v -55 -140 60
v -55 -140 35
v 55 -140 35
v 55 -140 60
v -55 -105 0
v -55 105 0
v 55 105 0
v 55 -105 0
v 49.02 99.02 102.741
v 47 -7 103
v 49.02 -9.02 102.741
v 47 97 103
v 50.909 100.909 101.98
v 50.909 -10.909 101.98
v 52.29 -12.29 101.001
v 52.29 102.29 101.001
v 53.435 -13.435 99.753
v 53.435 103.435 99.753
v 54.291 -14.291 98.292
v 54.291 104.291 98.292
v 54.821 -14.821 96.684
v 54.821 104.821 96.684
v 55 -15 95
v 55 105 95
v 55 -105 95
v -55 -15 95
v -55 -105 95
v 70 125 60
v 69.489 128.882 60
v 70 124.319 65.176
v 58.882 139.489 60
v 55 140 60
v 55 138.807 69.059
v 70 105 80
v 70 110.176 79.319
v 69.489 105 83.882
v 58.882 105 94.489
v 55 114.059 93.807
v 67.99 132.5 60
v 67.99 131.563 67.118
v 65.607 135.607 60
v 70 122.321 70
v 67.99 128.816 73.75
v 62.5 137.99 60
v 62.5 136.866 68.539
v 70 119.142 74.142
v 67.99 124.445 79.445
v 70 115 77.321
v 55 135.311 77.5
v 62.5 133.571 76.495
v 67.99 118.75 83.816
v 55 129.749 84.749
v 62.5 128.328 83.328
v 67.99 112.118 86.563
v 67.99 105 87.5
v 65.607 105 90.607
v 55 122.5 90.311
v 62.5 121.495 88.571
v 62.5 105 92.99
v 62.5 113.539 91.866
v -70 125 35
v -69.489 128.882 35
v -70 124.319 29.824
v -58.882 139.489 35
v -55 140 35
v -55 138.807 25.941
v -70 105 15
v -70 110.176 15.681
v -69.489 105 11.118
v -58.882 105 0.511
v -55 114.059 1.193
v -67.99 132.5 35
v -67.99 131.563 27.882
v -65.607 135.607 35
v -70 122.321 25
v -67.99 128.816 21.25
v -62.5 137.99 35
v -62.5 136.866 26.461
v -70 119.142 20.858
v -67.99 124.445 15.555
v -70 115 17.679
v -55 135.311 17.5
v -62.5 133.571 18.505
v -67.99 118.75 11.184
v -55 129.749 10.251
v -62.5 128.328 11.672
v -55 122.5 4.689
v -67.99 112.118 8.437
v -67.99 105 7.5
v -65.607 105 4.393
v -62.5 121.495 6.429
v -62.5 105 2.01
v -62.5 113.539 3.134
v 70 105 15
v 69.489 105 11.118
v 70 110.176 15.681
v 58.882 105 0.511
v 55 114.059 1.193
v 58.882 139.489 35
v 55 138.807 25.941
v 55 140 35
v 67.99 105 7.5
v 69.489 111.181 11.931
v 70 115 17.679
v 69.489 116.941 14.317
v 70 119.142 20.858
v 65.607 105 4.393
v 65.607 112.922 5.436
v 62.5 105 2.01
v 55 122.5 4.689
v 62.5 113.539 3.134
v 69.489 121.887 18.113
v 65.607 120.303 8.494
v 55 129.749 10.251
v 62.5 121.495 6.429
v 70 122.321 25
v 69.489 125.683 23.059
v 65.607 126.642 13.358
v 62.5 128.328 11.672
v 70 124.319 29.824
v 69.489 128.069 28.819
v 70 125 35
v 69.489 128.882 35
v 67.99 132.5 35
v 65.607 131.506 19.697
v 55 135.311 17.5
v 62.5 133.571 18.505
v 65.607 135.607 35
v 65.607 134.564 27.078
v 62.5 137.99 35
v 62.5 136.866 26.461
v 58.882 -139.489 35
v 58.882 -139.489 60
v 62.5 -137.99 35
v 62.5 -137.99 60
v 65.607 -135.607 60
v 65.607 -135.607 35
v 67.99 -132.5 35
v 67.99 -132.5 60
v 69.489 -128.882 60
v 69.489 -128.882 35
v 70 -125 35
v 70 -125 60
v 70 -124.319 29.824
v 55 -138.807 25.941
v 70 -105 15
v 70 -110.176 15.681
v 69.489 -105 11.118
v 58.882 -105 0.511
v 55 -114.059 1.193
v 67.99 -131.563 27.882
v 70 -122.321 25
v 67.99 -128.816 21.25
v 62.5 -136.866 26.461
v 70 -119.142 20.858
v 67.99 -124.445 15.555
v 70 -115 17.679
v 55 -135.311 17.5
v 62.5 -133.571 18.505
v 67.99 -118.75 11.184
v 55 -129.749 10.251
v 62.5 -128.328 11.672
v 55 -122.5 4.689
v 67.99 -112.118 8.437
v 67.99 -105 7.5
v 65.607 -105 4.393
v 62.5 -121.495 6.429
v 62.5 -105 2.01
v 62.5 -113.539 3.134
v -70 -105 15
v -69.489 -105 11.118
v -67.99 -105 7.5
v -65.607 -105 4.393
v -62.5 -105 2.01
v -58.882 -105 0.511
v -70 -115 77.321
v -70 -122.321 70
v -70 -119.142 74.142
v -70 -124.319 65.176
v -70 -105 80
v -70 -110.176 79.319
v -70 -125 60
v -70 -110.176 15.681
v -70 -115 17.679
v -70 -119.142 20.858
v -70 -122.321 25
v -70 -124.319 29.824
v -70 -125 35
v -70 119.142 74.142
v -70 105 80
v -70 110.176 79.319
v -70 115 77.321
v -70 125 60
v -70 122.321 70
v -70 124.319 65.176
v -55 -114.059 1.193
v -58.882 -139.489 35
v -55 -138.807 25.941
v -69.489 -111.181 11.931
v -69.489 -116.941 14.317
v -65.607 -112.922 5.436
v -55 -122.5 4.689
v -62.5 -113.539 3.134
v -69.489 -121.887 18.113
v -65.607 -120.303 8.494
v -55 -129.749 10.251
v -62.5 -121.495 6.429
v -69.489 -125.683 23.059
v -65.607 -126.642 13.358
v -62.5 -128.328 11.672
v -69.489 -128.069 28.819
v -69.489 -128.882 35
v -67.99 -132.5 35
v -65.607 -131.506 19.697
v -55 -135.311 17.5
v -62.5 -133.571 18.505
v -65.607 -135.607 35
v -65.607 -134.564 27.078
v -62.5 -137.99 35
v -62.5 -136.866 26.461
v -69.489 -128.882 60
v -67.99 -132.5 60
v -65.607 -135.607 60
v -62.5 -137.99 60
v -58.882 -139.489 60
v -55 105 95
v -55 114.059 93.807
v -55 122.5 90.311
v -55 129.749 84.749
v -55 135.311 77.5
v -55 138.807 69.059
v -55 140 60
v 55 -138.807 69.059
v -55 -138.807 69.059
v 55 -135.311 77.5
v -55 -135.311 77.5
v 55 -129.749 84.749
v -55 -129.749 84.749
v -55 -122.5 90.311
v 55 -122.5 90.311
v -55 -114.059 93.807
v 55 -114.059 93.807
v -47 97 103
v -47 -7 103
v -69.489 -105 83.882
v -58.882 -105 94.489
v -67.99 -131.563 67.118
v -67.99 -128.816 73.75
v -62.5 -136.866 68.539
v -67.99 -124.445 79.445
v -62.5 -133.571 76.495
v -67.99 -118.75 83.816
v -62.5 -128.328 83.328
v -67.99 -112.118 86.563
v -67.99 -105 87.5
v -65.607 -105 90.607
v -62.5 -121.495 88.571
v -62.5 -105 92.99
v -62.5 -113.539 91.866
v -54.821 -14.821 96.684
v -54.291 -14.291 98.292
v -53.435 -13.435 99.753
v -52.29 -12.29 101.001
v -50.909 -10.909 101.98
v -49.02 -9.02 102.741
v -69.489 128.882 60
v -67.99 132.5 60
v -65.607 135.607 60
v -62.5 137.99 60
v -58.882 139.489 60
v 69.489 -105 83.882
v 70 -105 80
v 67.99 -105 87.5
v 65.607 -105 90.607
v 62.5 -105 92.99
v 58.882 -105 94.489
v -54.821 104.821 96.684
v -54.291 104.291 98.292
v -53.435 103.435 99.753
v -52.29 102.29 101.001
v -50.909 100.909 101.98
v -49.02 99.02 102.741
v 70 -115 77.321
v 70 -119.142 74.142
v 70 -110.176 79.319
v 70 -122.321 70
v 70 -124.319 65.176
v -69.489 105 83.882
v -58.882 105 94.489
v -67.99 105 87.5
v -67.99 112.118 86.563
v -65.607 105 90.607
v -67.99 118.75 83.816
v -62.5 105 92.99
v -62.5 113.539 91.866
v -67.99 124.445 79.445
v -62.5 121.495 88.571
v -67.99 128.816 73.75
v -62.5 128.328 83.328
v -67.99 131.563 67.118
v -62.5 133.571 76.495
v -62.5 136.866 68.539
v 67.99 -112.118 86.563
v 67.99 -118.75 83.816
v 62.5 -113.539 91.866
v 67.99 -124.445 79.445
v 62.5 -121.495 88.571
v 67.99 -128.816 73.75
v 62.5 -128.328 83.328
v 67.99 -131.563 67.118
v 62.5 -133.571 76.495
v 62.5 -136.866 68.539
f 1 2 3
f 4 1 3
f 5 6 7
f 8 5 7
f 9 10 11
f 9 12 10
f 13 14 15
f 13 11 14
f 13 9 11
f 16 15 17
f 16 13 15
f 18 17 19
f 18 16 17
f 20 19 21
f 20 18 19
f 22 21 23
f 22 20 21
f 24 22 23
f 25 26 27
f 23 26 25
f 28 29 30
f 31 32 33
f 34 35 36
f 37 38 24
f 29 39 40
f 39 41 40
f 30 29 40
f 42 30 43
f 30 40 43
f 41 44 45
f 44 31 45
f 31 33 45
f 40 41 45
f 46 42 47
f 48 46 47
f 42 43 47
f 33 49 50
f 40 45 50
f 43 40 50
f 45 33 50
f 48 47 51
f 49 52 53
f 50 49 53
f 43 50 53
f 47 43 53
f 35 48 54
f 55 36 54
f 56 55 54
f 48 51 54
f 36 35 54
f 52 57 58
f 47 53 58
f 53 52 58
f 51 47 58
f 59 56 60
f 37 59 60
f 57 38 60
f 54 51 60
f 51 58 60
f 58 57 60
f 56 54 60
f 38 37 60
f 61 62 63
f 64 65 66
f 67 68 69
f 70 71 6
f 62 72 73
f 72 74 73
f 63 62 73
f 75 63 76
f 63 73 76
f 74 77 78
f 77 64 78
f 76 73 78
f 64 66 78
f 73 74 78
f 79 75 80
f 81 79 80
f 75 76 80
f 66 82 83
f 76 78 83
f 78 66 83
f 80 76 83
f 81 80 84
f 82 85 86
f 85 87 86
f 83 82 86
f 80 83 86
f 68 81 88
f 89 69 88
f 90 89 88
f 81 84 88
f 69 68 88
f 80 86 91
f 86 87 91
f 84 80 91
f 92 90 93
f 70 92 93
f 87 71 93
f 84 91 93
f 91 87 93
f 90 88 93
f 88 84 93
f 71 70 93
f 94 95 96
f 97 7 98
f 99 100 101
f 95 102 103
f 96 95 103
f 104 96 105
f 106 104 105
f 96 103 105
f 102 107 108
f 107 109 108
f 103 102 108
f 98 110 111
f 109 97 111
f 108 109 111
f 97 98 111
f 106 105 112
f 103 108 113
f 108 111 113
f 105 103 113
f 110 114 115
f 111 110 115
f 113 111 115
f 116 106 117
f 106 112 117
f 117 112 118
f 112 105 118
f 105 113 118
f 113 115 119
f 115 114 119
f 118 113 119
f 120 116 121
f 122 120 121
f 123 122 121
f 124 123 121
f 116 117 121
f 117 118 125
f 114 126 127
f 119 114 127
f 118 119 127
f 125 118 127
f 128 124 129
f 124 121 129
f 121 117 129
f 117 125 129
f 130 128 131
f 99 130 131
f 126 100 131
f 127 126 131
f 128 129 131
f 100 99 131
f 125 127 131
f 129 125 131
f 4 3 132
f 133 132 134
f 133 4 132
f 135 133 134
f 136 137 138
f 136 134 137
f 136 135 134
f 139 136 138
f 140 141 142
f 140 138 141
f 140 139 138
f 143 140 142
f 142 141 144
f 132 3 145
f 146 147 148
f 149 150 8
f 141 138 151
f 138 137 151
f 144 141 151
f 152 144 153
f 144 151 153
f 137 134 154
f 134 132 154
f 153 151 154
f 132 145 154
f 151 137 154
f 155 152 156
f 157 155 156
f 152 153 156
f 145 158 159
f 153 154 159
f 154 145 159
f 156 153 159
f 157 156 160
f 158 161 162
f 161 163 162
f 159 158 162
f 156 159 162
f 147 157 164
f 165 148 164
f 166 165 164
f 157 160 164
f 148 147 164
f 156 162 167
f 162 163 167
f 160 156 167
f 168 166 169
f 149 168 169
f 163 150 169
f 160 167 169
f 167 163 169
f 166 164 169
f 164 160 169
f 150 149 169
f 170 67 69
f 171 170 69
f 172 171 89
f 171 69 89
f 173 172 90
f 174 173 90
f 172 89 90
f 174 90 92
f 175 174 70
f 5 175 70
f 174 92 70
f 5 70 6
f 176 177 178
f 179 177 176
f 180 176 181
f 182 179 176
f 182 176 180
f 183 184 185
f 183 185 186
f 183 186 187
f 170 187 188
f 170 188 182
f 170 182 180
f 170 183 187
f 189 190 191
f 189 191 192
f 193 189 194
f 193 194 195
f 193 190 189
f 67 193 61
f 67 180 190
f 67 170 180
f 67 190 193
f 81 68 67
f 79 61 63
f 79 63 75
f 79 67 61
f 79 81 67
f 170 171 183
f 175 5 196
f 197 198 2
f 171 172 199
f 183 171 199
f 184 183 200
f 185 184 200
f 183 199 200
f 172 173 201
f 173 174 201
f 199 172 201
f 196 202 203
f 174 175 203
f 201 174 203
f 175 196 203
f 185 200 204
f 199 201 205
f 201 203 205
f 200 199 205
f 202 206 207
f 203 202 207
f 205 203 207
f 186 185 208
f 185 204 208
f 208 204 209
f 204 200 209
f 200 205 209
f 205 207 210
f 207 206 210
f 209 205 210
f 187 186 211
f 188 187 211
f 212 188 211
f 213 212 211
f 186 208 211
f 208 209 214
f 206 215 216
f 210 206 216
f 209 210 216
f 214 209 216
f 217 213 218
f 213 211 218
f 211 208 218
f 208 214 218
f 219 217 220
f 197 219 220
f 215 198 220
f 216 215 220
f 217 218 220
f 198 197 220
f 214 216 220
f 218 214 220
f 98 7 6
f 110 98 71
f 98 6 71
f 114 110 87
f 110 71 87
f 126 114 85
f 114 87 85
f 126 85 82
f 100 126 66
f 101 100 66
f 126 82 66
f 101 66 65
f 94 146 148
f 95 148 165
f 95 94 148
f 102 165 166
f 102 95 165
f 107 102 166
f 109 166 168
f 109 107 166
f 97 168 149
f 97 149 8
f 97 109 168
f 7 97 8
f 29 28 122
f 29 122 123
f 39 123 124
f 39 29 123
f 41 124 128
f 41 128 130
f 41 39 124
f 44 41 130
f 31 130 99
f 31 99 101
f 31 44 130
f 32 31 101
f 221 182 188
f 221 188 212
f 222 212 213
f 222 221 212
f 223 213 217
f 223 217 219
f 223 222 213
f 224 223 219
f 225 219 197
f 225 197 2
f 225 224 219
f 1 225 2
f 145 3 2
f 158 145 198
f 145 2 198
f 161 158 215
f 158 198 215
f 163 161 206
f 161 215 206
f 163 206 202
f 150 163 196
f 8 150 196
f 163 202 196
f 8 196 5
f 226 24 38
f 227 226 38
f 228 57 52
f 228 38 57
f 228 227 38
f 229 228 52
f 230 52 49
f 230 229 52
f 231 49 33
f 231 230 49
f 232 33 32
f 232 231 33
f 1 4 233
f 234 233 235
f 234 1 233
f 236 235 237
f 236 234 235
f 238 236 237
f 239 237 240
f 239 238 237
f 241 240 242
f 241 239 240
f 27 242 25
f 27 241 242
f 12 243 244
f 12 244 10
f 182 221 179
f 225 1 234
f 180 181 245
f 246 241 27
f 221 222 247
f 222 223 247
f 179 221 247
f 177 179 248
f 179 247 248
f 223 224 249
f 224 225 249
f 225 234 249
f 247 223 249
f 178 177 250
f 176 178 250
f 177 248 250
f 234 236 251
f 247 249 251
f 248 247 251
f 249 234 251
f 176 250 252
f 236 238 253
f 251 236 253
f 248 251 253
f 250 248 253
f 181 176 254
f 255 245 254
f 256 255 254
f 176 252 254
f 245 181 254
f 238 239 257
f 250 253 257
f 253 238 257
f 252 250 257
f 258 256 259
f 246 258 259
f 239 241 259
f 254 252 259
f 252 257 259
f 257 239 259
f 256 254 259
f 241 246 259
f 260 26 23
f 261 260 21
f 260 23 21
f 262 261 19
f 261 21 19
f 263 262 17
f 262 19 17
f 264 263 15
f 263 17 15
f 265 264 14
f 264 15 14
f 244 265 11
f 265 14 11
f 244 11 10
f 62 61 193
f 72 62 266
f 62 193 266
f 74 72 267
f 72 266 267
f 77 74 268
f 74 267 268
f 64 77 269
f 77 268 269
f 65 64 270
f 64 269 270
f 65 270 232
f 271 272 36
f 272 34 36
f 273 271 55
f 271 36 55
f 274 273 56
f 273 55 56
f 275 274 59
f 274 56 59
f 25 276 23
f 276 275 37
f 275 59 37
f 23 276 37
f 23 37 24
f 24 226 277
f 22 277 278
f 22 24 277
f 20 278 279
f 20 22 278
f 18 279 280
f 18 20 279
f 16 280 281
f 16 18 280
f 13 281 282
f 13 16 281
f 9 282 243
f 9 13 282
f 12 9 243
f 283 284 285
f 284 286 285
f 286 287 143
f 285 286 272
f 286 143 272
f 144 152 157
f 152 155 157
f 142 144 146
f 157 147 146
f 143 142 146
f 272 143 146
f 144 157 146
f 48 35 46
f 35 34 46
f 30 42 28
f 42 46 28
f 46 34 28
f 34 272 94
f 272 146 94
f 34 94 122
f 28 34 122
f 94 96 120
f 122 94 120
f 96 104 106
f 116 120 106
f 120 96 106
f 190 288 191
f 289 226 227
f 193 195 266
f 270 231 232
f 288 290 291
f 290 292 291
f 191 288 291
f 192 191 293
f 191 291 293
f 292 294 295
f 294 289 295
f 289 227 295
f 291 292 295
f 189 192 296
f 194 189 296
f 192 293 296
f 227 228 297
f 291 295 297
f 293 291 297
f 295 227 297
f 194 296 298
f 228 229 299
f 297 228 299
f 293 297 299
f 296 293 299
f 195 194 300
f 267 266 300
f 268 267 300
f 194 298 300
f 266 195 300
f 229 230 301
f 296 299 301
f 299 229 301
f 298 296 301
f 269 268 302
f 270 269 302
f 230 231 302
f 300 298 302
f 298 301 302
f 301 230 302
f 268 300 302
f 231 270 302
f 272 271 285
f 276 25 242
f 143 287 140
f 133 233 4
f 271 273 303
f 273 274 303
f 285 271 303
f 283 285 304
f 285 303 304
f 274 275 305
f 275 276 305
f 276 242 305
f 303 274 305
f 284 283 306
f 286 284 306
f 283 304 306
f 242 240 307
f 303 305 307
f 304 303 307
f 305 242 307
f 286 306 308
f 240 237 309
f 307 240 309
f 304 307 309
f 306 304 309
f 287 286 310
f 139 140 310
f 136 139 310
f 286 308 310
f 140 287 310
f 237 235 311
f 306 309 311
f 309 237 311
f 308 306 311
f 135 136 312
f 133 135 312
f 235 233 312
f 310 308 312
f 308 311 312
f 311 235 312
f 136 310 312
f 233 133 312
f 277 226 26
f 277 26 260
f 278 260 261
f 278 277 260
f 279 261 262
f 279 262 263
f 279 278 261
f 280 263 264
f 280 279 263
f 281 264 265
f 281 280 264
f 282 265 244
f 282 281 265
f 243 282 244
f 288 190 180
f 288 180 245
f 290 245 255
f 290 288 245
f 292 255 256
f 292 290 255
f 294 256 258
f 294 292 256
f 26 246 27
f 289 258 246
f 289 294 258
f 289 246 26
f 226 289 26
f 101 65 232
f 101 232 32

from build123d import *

# Parameters (mm, degrees)
F0_W         = 140
F0_H         = 280
F1_DEPTH     = 95
F2_R         = 15
F3_T1_DEPTH  = 140
F3_T4_ANGLE  = 90
F3_T6_ANGLE  = 90
F3_T8_ANGLE  = 90
F3_T10_ANGLE = 90
F3_T12_ANGLE = 90
F3_T14_ANGLE = 90
F3_T16_ANGLE = 90
F3_T18_ANGLE = 90
F4_W         = 110
F4_H         = 120
F5_DEPTH     = 8
F6_R         = 7.99999


# Not quite as in the source:
# - a fillet or chamfer that OpenCascade refuses, or shapes differently, is made with other operations: its cross-section is extruded or revolved along the edge and cut away or added
# - a fillet or chamfer is up to 0.001 mm smaller than in the source, because OpenCascade refuses the exact size


with BuildPart() as f1:
    # F0 (on Top) → F1 (new body)
    with BuildSketch(Plane.XY):
        Rectangle(F0_W, F0_H)
    extrude(amount=F1_DEPTH)

    # F2
    f2_edges = [f1.edges().sort_by_distance(p)[0] for p in [
        (70, -140, 47.5),
        (70, 140, 47.5),
        (70, 0, 0),
        (70, 0, 95),
        (-70, 140, 47.5),
        (-70, -140, 47.5),
        (-70, 0, 0),
        (-70, 0, 95),
    ]]
    fillet(f2_edges, radius=F2_R)

    # F3: fillet of radius 35 on 4 edges, made by hand

    # F3_s2 → F3_t1 (cut)
    with BuildSketch(Plane.YZ.offset(-70)):
        with BuildLine():
            ThreePointArc((-140, 60), (-129.7487373415, 84.7487373415), (-105, 95))
            Line((-105, 95), (-140, 95))
            Line((-140, 95), (-140, 60))
        make_face()
        with BuildLine():
            ThreePointArc((-140, 35), (-129.7487373415, 10.2512626585), (-105, 0))
            Line((-105, 0), (-140, 0))
            Line((-140, 0), (-140, 35))
        make_face()
        with BuildLine():
            ThreePointArc((105, 95), (129.7487373415, 84.7487373415), (140, 60))
            Line((140, 60), (140, 95))
            Line((140, 95), (105, 95))
        make_face()
        with BuildLine():
            ThreePointArc((105, 0), (129.7487373415, 10.2512626585), (140, 35))
            Line((140, 35), (140, 0))
            Line((140, 0), (105, 0))
        make_face()
    extrude(amount=F3_T1_DEPTH, mode=Mode.SUBTRACT)

    # F3_s3 → F3_t4 (revolve, cut)
    with BuildSketch(Plane.XZ.offset(-105)):
        with BuildLine():
            ThreePointArc((70, 15), (65.6066017178, 4.3933982822), (55, 0))
            Line((55, 0), (70, 0))
            Line((70, 0), (70, 15))
        make_face()
    revolve(axis=Axis((70, 105, 35), (1, 0, 0)), revolution_arc=F3_T4_ANGLE, mode=Mode.SUBTRACT)

    # F3_s5 → F3_t6 (revolve, cut)
    with BuildSketch(Plane.XY.offset(35)):
        with BuildLine():
            ThreePointArc((-70, 125), (-65.6066017178, 135.6066017178), (-55, 140))
            Line((-55, 140), (-70, 140))
            Line((-70, 140), (-70, 125))
        make_face()
    revolve(axis=Axis((-70, 105, 35), (-1, 0, 0)), revolution_arc=F3_T6_ANGLE, mode=Mode.SUBTRACT)

    # F3_s7 → F3_t8 (revolve, cut)
    with BuildSketch(Plane.XY.offset(60)):
        with BuildLine():
            ThreePointArc((70, 125), (65.6066017178, 135.6066017178), (55, 140))
            Line((55, 140), (70, 140))
            Line((70, 140), (70, 125))
        make_face()
    revolve(axis=Axis((70, 105, 60), (1, 0, 0)), revolution_arc=F3_T8_ANGLE, mode=Mode.SUBTRACT)

    # F3_s9 → F3_t10 (revolve, cut)
    with BuildSketch(Plane.XZ.offset(-105)):
        with BuildLine():
            ThreePointArc((-70, 80), (-65.6066017178, 90.6066017178), (-55, 95))
            Line((-55, 95), (-70, 95))
            Line((-70, 95), (-70, 80))
        make_face()
    revolve(axis=Axis((-70, 105, 60), (-1, 0, 0)), revolution_arc=F3_T10_ANGLE, mode=Mode.SUBTRACT)

    # F3_s11 → F3_t12 (revolve, cut)
    with BuildSketch(Plane.XZ.offset(105)):
        with BuildLine():
            ThreePointArc((-70, 15), (-65.6066017178, 4.3933982822), (-55, 0))
            Line((-55, 0), (-70, 0))
            Line((-70, 0), (-70, 15))
        make_face()
    revolve(axis=Axis((-70, -105, 35), (-1, 0, 0)), revolution_arc=F3_T12_ANGLE, mode=Mode.SUBTRACT)

    # F3_s13 → F3_t14 (revolve, cut)
    with BuildSketch(Plane.XY.offset(35)):
        with BuildLine():
            ThreePointArc((70, -125), (65.6066017178, -135.6066017178), (55, -140))
            Line((55, -140), (70, -140))
            Line((70, -140), (70, -125))
        make_face()
    revolve(axis=Axis((70, -105, 35), (1, 0, 0)), revolution_arc=F3_T14_ANGLE, mode=Mode.SUBTRACT)

    # F3_s15 → F3_t16 (revolve, cut)
    with BuildSketch(Plane.XY.offset(60)):
        with BuildLine():
            ThreePointArc((-70, -125), (-65.6066017178, -135.6066017178), (-55, -140))
            Line((-55, -140), (-70, -140))
            Line((-70, -140), (-70, -125))
        make_face()
    revolve(axis=Axis((-70, -105, 60), (-1, 0, 0)), revolution_arc=F3_T16_ANGLE, mode=Mode.SUBTRACT)

    # F3_s17 → F3_t18 (revolve, cut)
    with BuildSketch(Plane.XZ.offset(105)):
        with BuildLine():
            ThreePointArc((70, 80), (65.6066017178, 90.6066017178), (55, 95))
            Line((55, 95), (70, 95))
            Line((70, 95), (70, 80))
        make_face()
    revolve(axis=Axis((70, -105, 60), (1, 0, 0)), revolution_arc=F3_T18_ANGLE, mode=Mode.SUBTRACT)

    # F4 (on face) → F5 (join)
    with BuildSketch(Plane.XY.offset(95)):
        with Locations((0, 45)):
            Rectangle(F4_W, F4_H)
    extrude(amount=F5_DEPTH)

    # F6 (radius 8 in the source; OpenCascade refuses exactly that, so slightly less here)
    f6_edges = [f1.edges().sort_by_distance(p)[0] for p in [
        (0, 105, 103),
        (-55, 45, 103),
        (0, -15, 103),
        (55, 45, 103),
    ]]
    fillet(f6_edges, radius=F6_R)


solid = f1.part
